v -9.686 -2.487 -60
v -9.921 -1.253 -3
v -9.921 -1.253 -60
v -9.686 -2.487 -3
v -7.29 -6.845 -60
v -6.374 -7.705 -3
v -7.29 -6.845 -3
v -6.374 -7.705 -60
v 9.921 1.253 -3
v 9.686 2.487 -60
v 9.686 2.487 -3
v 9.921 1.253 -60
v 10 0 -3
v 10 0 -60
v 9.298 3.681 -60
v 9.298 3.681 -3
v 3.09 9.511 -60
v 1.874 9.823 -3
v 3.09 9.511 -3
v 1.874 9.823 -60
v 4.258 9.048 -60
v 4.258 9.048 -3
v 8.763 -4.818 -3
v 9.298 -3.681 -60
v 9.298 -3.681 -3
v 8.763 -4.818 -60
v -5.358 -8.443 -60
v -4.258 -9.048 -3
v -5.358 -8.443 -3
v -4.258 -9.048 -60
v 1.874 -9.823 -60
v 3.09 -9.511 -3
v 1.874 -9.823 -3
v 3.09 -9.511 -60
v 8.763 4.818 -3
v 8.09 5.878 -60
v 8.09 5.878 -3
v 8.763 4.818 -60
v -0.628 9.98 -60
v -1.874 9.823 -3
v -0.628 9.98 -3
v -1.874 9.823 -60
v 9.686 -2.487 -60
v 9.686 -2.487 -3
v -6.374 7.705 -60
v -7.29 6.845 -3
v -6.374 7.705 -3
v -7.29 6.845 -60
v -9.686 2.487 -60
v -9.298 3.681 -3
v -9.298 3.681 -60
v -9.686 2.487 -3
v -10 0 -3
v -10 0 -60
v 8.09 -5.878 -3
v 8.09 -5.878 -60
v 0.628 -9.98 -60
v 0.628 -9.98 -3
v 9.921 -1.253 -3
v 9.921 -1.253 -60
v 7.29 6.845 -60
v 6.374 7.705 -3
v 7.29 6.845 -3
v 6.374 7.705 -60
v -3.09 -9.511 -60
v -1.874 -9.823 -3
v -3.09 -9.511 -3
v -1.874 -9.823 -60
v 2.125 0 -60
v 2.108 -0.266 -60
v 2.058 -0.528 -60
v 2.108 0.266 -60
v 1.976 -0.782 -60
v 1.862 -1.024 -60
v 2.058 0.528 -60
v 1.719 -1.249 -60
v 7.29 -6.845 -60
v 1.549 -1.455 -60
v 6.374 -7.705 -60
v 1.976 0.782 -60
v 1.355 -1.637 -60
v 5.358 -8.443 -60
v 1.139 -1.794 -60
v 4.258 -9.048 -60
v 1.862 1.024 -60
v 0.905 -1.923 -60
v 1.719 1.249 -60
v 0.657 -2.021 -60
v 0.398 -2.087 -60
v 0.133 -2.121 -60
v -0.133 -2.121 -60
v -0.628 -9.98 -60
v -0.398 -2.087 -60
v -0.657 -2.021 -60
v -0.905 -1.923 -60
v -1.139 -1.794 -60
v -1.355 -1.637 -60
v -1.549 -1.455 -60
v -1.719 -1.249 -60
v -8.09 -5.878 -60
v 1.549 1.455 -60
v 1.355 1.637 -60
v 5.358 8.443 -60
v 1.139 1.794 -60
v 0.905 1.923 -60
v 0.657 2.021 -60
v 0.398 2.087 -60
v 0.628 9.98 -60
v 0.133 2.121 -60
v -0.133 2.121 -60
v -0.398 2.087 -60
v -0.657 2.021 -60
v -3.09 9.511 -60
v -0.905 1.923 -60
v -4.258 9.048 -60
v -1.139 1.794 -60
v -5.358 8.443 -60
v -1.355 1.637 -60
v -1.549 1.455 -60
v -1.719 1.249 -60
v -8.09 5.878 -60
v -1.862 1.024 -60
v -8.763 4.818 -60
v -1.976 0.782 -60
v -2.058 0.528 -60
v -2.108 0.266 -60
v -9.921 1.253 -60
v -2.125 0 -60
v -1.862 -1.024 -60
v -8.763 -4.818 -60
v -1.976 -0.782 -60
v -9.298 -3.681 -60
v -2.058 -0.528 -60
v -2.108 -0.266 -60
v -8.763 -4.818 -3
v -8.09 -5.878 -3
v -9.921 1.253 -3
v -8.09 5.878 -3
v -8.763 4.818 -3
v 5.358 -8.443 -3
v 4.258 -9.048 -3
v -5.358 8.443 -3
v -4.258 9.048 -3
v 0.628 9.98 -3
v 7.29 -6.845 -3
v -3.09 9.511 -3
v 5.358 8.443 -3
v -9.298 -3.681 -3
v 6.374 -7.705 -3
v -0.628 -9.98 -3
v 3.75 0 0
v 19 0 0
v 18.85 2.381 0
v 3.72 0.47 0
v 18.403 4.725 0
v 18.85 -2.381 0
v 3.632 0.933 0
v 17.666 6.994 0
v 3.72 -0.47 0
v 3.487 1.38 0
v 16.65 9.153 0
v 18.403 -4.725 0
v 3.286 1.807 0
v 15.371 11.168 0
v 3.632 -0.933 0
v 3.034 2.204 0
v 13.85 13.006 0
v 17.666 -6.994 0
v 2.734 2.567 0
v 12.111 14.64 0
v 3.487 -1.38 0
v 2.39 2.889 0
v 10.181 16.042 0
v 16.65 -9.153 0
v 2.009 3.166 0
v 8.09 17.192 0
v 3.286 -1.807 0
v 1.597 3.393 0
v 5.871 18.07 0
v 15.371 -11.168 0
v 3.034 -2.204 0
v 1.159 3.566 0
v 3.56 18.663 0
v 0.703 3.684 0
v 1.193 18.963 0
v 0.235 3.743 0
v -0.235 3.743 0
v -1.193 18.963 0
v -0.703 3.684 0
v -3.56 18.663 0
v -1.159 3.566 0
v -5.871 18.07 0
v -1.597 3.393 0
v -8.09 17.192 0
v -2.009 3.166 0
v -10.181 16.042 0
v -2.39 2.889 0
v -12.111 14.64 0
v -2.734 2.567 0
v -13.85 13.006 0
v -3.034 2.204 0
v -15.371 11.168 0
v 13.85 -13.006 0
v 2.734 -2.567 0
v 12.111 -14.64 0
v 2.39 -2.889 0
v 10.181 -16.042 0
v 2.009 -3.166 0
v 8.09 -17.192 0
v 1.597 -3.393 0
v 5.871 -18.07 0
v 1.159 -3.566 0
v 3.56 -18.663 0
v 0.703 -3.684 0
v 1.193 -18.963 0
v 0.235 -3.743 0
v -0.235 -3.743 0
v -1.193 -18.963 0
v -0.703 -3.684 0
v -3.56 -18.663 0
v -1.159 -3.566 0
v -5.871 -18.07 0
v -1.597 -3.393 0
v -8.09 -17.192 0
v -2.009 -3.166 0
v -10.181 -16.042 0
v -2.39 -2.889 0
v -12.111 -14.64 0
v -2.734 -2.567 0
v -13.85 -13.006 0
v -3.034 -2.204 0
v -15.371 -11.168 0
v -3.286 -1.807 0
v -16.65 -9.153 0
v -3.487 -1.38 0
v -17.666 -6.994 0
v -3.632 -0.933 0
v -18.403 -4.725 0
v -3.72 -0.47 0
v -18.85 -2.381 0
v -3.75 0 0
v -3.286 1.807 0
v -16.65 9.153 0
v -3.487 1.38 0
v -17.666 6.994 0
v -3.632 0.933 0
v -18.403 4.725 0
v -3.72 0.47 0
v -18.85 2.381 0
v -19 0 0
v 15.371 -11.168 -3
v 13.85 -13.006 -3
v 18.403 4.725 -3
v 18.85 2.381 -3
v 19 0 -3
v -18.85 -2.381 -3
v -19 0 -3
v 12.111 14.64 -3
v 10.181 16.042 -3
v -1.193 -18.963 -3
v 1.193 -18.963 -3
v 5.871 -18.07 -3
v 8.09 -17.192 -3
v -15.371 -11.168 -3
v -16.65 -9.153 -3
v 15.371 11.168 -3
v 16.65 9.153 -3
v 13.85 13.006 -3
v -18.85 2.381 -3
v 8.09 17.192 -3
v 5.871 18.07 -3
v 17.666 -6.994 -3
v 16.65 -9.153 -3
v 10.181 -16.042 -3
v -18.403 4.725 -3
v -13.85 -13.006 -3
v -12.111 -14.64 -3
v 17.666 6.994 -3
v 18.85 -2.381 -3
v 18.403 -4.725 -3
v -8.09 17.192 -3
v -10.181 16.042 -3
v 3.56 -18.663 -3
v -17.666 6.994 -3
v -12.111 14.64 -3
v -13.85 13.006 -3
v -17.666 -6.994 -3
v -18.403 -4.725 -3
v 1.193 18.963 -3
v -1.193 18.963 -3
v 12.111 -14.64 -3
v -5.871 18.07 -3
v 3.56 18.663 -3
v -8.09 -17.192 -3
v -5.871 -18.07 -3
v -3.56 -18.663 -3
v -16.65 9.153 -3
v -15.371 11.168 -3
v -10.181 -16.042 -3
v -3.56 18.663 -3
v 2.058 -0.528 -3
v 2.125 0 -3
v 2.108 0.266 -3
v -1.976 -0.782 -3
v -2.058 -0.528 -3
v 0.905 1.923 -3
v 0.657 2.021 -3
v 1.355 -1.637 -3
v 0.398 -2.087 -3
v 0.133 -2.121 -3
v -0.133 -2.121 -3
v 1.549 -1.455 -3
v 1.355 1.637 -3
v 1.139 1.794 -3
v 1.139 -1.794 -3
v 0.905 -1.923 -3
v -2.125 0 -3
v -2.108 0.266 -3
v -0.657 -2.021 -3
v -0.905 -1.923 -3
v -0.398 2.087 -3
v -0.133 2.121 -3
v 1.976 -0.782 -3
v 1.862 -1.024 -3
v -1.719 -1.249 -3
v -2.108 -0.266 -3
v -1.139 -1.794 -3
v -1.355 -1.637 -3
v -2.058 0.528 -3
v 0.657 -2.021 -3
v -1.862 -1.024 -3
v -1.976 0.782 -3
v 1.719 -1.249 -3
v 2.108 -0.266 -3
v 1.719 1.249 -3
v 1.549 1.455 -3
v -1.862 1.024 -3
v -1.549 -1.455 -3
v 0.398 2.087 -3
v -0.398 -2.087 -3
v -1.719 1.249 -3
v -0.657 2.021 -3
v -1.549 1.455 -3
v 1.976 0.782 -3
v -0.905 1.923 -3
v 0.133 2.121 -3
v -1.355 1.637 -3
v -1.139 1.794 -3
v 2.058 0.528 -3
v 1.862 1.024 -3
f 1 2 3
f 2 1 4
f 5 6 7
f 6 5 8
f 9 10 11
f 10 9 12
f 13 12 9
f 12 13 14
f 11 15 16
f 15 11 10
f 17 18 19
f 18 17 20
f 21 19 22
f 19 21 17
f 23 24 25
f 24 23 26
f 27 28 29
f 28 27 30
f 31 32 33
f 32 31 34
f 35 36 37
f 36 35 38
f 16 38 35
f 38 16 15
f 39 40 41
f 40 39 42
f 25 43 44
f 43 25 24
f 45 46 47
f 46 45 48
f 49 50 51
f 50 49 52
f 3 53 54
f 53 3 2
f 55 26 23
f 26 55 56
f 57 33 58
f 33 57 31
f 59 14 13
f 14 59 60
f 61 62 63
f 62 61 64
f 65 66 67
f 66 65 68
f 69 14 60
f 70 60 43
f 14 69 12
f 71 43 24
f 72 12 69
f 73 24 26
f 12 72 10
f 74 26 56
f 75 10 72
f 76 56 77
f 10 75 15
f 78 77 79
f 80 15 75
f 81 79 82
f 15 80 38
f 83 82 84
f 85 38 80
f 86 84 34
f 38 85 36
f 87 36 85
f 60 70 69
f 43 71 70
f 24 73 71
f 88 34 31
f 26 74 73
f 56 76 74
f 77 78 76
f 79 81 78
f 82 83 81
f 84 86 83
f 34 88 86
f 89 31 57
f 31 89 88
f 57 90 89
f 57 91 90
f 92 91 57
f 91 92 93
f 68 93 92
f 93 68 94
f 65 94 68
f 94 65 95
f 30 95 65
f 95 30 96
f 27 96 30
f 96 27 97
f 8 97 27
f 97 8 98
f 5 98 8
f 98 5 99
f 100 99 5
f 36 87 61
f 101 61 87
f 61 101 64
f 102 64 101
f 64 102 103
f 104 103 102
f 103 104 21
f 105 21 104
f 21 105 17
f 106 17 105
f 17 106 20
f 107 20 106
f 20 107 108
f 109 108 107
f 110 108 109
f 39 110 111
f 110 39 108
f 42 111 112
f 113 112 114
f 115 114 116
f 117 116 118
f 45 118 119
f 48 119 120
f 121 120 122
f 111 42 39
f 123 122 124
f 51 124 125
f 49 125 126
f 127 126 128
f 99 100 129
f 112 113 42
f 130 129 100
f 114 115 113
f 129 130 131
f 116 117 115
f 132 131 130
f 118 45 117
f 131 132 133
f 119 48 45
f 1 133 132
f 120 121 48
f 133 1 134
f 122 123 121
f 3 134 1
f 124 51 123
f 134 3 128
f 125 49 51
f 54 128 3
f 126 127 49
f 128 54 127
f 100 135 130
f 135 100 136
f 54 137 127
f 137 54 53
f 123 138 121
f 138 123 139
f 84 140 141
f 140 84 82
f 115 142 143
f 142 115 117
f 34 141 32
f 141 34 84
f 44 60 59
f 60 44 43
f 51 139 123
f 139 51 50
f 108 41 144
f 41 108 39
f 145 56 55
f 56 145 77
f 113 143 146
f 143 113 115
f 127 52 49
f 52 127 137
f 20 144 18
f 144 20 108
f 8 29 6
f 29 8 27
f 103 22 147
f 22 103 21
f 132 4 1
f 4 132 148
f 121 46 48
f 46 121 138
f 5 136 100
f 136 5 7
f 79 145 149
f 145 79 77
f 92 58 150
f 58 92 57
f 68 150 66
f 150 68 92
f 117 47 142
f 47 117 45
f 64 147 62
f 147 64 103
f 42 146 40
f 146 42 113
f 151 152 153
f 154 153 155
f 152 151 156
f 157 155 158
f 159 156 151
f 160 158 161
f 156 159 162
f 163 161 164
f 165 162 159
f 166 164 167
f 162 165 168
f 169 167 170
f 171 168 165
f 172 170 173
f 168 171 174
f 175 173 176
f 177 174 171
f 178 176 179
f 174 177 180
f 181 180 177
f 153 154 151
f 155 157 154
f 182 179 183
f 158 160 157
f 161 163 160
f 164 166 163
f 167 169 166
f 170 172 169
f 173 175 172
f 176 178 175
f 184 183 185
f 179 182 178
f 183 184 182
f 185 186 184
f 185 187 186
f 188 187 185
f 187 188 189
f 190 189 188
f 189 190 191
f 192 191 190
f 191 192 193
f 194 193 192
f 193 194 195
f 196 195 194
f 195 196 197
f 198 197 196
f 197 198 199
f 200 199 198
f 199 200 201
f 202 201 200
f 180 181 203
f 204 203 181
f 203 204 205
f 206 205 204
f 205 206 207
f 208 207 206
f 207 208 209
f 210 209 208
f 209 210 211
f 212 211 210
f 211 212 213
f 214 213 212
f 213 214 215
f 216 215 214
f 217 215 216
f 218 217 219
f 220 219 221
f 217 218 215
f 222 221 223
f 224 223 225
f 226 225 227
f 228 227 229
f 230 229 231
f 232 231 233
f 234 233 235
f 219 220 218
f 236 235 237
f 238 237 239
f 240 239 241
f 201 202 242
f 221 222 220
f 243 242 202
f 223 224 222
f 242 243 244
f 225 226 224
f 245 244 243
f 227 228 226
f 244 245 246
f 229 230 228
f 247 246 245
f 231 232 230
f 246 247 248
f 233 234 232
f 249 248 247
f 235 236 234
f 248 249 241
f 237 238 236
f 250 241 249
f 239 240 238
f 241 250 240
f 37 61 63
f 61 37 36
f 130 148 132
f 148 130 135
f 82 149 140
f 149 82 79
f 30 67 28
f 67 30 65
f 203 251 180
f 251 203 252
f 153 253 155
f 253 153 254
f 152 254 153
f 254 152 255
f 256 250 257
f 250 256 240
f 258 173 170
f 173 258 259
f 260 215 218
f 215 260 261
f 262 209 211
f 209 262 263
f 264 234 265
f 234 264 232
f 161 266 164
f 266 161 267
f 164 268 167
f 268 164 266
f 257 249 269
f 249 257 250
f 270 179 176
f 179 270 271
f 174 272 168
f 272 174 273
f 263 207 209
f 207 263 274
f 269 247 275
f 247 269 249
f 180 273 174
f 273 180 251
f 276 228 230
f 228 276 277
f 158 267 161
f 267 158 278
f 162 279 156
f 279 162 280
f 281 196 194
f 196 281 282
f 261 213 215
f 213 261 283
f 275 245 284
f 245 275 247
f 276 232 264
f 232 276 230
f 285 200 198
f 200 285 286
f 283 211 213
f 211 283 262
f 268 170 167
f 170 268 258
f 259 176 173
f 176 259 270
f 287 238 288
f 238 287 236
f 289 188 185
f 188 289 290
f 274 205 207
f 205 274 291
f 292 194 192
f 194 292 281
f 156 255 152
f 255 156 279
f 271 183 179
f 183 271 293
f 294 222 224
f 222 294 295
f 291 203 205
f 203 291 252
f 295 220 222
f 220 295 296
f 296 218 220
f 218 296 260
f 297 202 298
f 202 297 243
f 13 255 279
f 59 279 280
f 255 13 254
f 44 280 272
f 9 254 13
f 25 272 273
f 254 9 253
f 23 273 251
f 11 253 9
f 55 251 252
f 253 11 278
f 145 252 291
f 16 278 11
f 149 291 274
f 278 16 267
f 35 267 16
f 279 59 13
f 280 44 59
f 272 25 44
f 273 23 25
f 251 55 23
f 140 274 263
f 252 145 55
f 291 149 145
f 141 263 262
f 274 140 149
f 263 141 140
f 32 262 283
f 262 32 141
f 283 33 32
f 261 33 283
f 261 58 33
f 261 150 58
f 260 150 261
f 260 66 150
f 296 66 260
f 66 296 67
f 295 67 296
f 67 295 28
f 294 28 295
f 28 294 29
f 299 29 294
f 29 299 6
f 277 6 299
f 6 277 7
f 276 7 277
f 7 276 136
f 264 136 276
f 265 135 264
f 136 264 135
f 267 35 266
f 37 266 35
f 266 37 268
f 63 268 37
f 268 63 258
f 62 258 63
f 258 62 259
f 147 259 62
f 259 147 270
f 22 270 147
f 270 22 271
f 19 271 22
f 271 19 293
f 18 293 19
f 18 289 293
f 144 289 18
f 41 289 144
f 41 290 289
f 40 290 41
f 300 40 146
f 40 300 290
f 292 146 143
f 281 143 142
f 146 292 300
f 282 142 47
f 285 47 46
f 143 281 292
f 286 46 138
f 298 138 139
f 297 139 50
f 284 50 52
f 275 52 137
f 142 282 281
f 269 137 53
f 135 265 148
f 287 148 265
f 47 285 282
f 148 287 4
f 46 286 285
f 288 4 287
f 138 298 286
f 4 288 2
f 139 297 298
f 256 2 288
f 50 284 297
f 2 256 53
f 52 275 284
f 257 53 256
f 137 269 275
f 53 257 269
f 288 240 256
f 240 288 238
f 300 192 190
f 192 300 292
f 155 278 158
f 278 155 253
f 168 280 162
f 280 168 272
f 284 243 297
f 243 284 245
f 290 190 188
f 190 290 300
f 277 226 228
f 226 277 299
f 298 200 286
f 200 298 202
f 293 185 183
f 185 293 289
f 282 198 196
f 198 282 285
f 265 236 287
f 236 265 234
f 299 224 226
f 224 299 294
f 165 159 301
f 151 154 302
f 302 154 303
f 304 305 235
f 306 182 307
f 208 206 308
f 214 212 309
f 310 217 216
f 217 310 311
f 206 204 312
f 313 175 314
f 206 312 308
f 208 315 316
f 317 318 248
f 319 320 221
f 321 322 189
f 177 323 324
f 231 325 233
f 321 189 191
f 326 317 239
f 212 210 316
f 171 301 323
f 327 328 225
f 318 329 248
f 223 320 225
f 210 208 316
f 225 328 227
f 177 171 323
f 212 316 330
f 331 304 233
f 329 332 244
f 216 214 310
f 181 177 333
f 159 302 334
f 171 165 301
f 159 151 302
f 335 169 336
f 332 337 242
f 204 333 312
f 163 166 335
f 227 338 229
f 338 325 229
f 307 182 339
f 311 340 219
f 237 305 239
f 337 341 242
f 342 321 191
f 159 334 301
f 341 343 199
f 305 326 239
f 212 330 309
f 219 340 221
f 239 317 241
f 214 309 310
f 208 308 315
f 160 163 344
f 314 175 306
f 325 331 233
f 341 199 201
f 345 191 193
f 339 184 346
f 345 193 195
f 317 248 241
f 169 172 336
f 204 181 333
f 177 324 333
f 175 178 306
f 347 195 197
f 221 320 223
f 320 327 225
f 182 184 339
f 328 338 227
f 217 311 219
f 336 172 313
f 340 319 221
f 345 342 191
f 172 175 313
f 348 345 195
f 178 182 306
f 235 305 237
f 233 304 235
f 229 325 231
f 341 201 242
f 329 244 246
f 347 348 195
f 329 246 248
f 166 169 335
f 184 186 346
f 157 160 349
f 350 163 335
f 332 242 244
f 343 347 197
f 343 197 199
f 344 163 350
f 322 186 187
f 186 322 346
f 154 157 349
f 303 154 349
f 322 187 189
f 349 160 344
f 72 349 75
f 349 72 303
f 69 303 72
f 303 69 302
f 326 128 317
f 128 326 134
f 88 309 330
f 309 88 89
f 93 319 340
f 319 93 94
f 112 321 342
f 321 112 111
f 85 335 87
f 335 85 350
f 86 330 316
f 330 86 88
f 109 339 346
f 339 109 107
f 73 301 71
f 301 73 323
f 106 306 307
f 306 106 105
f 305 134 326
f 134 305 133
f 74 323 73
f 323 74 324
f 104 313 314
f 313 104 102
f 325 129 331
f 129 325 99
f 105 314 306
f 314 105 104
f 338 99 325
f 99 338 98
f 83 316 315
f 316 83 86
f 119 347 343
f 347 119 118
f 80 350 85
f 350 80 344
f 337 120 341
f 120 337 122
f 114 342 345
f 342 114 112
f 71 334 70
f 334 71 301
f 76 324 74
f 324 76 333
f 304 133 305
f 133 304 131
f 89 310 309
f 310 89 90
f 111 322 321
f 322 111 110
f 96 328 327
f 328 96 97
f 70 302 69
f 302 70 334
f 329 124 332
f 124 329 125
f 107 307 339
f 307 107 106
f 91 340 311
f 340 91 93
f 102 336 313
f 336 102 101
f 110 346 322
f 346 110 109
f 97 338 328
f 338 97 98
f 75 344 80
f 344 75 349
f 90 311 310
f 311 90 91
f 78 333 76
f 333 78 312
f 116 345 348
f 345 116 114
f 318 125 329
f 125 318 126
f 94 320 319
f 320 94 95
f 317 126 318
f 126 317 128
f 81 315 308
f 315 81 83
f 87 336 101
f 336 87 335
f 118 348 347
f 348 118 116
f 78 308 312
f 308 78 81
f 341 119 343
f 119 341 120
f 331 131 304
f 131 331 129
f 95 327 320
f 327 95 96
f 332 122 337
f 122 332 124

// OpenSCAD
$fn = 50;


difference() {
	union() {
		translate(v = [0, 0, -60.0000000000]) {
			cylinder(h = 60, r = 10.0000000000);
		}
		translate(v = [0, 0, -3.0000000000]) {
			cylinder(h = 3, r = 19.0000000000);
		}
	}
	union() {
		translate(v = [0, 0, 0]) {
			rotate(a = [0, 0, 0]) {
				difference() {
					union() {
						#translate(v = [0, 0, -60.0000000000]) {
							cylinder(h = 60, r = 2.0000000000);
						}
						#translate(v = [0, 0, -3]) {
							cylinder(h = 3, r = 10.0000000000, r1 = 2.1250000000, r2 = 3.7500000000);
						}
						#translate(v = [0, 0, -60.0000000000]) {
							cylinder(h = 60, r = 2.1250000000);
						}
						#translate(v = [0, 0, -60.0000000000]) {
							cylinder(h = 60, r = 2.0000000000);
						}
					}
					union();
				}
			}
		}
	}
}
